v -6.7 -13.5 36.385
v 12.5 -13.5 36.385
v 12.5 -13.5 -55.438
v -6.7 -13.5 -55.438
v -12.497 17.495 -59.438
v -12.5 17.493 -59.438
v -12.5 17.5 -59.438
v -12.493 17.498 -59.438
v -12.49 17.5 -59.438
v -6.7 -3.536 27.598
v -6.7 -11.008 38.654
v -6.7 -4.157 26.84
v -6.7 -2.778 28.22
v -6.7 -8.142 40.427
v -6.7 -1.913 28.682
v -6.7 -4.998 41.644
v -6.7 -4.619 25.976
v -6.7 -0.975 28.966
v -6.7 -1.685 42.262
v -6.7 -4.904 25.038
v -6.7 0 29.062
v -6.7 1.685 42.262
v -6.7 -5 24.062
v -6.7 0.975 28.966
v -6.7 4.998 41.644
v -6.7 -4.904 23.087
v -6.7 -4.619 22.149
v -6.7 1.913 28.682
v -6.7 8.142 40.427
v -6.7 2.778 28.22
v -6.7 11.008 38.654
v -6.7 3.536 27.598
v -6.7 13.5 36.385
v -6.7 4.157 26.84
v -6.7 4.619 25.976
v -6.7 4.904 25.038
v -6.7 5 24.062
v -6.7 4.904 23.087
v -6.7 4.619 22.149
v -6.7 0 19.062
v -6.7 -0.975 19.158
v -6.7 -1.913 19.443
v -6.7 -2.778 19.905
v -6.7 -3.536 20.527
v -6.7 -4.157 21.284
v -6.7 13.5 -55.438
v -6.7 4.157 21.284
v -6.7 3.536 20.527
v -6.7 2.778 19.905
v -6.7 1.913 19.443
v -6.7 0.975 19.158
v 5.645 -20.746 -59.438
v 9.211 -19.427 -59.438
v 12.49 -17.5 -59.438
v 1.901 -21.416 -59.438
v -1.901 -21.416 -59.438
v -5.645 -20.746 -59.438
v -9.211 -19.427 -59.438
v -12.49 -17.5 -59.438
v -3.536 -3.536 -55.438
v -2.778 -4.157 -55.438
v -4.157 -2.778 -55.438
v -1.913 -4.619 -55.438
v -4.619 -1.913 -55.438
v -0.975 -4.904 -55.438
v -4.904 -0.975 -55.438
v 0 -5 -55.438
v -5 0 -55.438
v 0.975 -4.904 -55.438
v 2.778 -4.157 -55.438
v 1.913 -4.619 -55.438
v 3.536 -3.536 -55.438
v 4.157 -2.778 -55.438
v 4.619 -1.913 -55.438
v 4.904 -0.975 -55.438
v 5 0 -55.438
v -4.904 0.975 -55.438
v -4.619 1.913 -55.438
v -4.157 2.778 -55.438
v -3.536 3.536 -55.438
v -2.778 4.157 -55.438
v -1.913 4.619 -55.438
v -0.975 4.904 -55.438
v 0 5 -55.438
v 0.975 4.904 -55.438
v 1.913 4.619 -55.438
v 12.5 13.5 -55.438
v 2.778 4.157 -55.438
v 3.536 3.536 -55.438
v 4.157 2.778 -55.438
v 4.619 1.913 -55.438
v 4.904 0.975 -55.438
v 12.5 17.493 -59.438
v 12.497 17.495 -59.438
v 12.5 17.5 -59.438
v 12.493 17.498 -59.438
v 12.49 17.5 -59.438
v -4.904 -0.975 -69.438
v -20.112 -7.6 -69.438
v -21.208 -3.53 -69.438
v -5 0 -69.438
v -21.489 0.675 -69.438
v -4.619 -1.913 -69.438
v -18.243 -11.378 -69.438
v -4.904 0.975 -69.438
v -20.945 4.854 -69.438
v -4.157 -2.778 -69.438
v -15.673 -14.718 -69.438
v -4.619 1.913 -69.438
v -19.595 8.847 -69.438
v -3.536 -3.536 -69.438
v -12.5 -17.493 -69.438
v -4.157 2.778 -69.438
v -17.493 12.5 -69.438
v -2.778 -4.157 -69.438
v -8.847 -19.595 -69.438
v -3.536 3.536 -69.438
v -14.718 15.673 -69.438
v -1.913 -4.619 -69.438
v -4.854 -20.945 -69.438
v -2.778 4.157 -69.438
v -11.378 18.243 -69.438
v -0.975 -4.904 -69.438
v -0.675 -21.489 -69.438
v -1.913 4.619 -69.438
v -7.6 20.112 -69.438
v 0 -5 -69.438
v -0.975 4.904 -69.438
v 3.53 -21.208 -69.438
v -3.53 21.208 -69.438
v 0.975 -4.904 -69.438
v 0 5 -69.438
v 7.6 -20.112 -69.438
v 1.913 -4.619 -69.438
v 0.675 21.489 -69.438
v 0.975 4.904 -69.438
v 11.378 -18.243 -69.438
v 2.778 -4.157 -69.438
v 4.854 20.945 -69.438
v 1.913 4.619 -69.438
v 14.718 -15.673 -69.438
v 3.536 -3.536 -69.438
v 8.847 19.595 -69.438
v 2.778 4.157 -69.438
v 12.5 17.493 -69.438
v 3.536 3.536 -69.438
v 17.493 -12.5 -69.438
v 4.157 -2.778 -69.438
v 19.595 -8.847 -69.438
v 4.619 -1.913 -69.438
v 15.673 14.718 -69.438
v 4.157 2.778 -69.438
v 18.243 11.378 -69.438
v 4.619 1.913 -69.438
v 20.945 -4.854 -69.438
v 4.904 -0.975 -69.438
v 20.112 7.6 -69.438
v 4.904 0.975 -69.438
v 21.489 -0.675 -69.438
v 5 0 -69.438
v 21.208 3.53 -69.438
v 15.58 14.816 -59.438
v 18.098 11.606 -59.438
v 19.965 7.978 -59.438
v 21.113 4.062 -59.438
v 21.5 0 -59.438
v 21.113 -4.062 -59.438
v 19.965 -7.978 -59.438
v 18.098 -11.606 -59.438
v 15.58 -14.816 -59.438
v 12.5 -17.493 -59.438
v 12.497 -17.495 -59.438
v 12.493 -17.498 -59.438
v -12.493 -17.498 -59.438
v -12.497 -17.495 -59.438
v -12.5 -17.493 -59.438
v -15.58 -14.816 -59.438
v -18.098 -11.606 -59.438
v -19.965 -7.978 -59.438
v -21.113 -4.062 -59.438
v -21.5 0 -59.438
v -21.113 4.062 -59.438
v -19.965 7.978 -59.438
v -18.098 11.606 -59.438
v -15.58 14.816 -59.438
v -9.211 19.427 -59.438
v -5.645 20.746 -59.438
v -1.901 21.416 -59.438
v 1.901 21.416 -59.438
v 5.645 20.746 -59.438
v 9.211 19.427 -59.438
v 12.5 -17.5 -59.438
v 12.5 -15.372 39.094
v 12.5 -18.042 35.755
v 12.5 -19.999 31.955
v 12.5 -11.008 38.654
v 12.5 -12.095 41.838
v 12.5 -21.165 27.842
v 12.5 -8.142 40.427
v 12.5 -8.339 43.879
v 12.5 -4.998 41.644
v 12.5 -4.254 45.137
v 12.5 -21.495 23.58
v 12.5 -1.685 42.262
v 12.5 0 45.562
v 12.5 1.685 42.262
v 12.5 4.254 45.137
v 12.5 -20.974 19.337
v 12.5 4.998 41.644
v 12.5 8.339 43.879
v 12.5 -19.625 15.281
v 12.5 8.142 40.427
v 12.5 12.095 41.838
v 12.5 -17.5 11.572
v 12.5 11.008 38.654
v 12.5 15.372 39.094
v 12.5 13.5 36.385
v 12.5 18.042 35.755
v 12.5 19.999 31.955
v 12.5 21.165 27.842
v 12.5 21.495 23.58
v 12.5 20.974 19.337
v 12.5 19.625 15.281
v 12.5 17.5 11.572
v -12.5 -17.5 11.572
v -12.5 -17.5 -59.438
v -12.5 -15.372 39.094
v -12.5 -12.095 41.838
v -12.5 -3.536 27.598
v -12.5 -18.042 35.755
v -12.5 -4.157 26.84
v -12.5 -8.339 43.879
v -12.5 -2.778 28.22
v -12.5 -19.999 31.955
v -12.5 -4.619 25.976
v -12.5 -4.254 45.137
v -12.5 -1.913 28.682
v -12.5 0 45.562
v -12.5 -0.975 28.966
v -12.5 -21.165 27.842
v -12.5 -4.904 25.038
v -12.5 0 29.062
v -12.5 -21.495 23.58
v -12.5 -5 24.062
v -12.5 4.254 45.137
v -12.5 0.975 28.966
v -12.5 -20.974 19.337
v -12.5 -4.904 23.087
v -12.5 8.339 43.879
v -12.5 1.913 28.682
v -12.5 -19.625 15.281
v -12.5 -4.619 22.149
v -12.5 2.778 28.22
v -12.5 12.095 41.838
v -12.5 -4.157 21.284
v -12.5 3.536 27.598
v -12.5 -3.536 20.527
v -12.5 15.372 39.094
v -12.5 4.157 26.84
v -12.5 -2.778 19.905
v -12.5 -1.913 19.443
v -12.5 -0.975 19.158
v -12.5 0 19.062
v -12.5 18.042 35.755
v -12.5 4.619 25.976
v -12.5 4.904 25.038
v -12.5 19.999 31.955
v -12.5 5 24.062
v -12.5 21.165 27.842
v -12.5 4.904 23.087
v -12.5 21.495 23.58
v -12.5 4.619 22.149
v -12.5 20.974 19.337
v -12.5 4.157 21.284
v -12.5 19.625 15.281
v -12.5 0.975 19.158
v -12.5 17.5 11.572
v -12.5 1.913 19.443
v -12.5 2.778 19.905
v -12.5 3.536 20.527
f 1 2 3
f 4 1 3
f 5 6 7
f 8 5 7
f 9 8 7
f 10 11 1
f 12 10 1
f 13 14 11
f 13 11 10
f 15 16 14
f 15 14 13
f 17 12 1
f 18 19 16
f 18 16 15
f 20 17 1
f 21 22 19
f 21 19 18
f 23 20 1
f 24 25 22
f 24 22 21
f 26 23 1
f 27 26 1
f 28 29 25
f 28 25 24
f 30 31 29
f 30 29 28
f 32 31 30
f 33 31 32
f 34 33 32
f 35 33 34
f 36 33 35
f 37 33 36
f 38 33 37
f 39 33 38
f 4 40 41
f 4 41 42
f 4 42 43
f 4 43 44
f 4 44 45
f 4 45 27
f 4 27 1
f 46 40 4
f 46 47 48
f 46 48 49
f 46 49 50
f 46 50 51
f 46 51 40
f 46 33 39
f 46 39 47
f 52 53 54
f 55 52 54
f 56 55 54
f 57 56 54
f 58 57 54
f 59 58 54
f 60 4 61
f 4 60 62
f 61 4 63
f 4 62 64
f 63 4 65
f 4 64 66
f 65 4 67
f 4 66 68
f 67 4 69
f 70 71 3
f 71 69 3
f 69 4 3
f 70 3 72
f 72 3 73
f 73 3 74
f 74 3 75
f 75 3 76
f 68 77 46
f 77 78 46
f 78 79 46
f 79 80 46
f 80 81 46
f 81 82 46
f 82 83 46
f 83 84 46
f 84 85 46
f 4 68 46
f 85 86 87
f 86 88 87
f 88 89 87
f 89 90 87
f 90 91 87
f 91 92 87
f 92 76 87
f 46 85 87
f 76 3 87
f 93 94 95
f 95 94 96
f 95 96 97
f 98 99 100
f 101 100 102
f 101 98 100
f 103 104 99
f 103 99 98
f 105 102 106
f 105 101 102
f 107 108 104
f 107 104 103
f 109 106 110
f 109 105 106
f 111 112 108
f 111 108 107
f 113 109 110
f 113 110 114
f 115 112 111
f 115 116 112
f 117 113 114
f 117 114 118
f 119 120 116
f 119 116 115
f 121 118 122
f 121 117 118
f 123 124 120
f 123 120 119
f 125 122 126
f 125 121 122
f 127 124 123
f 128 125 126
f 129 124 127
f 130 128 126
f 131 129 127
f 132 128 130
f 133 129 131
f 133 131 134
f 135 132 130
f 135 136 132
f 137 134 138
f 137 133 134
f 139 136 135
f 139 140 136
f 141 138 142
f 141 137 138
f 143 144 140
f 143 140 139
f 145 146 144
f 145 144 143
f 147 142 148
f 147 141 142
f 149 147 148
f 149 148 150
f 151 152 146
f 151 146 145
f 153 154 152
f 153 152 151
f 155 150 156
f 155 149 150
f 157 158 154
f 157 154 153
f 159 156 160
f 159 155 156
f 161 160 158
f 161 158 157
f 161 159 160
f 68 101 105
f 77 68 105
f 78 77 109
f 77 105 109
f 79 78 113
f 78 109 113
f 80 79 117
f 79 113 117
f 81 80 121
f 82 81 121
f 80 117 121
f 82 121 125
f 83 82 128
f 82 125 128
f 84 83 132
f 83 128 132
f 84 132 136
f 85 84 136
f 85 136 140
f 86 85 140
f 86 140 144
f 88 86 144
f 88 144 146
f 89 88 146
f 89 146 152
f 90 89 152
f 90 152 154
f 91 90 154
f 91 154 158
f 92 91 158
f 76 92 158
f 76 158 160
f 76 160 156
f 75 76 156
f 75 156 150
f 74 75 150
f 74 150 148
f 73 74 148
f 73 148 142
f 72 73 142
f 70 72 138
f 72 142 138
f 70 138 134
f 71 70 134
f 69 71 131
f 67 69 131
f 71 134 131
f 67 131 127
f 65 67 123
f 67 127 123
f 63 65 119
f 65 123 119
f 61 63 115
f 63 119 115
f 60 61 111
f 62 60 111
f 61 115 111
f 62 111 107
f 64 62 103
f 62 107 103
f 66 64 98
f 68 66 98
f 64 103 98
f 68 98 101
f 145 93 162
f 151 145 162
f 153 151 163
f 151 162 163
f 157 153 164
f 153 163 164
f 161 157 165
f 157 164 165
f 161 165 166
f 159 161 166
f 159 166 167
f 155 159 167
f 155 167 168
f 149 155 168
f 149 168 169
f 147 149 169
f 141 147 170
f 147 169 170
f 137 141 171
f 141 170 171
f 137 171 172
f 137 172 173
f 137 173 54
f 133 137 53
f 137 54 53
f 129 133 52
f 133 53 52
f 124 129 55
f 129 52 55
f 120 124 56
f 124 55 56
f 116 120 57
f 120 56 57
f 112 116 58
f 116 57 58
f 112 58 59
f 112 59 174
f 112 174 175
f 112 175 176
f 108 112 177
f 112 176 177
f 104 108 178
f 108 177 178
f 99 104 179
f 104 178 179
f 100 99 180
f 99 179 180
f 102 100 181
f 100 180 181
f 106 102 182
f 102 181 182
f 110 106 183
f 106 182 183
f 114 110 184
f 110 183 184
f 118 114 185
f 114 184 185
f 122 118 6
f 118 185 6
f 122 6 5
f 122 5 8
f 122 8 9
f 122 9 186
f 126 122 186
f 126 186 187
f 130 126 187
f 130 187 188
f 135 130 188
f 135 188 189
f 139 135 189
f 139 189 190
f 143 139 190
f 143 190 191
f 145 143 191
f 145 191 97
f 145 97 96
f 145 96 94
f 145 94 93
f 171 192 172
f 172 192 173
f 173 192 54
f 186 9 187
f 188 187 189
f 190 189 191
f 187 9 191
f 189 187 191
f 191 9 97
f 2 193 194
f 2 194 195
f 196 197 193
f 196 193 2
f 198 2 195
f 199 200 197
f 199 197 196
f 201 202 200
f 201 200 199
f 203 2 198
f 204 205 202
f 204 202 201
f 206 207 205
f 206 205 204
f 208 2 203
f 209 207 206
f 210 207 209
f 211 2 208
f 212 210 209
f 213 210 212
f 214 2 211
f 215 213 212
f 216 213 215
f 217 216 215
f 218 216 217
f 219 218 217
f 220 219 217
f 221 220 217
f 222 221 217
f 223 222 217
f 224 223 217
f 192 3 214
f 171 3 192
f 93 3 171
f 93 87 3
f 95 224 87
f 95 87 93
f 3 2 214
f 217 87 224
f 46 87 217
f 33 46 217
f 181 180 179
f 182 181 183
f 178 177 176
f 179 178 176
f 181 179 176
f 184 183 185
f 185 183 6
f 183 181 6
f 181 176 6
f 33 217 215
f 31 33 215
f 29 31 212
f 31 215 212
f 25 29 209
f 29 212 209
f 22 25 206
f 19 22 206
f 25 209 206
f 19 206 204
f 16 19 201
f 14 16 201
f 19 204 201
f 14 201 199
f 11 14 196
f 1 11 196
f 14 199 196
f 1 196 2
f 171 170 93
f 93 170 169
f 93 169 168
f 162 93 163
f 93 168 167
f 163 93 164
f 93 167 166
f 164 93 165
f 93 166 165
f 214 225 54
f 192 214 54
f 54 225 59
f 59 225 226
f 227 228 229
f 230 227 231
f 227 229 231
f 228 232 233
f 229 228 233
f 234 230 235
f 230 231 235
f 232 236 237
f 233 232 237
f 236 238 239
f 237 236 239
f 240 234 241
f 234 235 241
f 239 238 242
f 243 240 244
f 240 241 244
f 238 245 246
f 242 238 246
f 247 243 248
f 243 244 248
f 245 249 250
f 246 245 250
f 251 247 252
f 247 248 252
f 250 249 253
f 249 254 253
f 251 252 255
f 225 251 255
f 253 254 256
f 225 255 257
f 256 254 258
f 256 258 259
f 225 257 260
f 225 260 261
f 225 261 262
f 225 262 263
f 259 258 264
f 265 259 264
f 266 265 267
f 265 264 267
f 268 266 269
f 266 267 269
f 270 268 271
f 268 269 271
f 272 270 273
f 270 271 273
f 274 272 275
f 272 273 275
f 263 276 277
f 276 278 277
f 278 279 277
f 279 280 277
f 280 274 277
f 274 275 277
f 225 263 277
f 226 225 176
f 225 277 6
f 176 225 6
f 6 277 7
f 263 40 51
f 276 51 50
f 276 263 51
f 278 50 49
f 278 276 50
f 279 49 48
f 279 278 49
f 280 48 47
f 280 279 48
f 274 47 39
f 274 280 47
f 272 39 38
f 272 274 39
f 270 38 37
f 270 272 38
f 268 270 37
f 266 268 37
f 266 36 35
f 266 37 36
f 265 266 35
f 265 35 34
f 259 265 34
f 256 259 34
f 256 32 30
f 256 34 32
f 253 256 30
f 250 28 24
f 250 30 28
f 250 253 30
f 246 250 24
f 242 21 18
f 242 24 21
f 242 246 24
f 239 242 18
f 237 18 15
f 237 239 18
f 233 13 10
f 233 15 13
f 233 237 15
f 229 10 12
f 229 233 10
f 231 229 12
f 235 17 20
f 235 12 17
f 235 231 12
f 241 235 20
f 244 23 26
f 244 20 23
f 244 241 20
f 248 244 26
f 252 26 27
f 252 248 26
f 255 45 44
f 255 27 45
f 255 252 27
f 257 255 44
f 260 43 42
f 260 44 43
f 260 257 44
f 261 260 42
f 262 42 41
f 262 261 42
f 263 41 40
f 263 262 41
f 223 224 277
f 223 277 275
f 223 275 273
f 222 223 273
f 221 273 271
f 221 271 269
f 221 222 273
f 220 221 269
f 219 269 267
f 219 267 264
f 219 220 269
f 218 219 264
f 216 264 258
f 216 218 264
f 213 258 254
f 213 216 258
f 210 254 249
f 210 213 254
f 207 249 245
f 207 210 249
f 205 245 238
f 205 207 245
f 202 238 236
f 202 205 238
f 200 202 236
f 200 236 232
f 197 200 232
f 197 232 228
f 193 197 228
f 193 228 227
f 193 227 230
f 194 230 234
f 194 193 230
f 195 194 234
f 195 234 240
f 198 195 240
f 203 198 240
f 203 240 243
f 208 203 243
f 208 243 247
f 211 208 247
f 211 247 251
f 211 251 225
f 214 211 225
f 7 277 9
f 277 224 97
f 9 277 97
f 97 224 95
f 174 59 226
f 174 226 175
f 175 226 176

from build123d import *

# Parameters (mm, degrees)
CROQUIS2_R              = 21.5
CROQUIS2_R_2            = 5
CROQUIS2_W              = 71.010004003
CROQUIS2_H              = 35
SALIENTE_EXTRUIR1_DEPTH = 12.5
CORTAR_EXTRUIR1_DEPTH   = 19.2
CROQUIS4_R              = 21.5
SALIENTE_EXTRUIR2_DEPTH = 10
CROQUIS5_R              = 5
CORTAR_EXTRUIR3_DEPTH   = 19


with BuildPart() as part:
    # Croquis2 → Saliente-Extruir1 (new, symmetric)
    # profile 1 of 2: a face of its own
    with BuildSketch(Plane(origin=(0, 0, 0), x_dir=(0, 0, -1), z_dir=(1, 0, 0))):
        with Locations((-24.062155912, 0)):
            Circle(CROQUIS2_R)
        with Locations((-24.062155912, 0)):
            Circle(CROQUIS2_R_2, mode=Mode.SUBTRACT)
    # profile 2 of 2: a face of its own
    with BuildSketch(Plane(origin=(0, 0, 0), x_dir=(0, 0, -1), z_dir=(1, 0, 0))):
        with Locations((23.932842087, 0)):
            Rectangle(CROQUIS2_W, CROQUIS2_H)
    extrude(amount=SALIENTE_EXTRUIR1_DEPTH, both=True)

    # Croquis3 → Cortar-Extruir1 (cut)
    with BuildSketch(Plane(origin=(12.5, 0, 0), x_dir=(0, 0, -1), z_dir=(1, 0, 0))):
        with BuildLine():
            Line((55.437844088, -13.5), (55.437844088, 13.5))
            Line((55.437844088, 13.5), (-11.739767465, 13.5))
            ThreePointArc((-11.739767465, 13.5), (-7.339089709, 7.377690276), (-5.783992518, 0))
            ThreePointArc((-5.783992518, 0), (-7.339089709, -7.377690276), (-11.739767465, -13.5))
            Line((-11.739767465, -13.5), (55.437844088, -13.5))
        make_face()
        with BuildLine():
            ThreePointArc((-5.783992518, 0), (-7.339089709, 7.377690276), (-11.739767465, 13.5))
            Line((-11.739767465, 13.5), (-36.384544359, 13.5))
            Line((-36.384544359, 13.5), (-36.384544359, -13.5))
            Line((-36.384544359, -13.5), (-11.739767465, -13.5))
            ThreePointArc((-11.739767465, -13.5), (-7.339089709, -7.377690276), (-5.783992518, 0))
        make_face()
        with BuildLine():
            Line((-36.384544359, -13.5), (-36.384544359, 13.5))
            ThreePointArc((-36.384544359, 13.5), (-42.340319305, 0), (-36.384544359, -13.5))
        make_face()
    extrude(amount=-CORTAR_EXTRUIR1_DEPTH, mode=Mode.SUBTRACT)

    # Croquis4 → Saliente-Extruir2 (add)
    with BuildSketch(Plane(origin=(0, 0, -59.437844088), x_dir=(-1, 0, 0), z_dir=(0, 0, -1))):
        with Locations(Location((0, 0, 0), (0, 0, 125.548744003))):
            Circle(CROQUIS4_R)
    extrude(amount=SALIENTE_EXTRUIR2_DEPTH)

    # Croquis5 → Cortar-Extruir3 (cut)
    with BuildSketch(Plane(origin=(0, 0, -69.437844088), x_dir=(-1, 0, 0), z_dir=(0, 0, -1))):
        Circle(CROQUIS5_R)
    extrude(amount=-CORTAR_EXTRUIR3_DEPTH, mode=Mode.SUBTRACT)


solid = part.part
